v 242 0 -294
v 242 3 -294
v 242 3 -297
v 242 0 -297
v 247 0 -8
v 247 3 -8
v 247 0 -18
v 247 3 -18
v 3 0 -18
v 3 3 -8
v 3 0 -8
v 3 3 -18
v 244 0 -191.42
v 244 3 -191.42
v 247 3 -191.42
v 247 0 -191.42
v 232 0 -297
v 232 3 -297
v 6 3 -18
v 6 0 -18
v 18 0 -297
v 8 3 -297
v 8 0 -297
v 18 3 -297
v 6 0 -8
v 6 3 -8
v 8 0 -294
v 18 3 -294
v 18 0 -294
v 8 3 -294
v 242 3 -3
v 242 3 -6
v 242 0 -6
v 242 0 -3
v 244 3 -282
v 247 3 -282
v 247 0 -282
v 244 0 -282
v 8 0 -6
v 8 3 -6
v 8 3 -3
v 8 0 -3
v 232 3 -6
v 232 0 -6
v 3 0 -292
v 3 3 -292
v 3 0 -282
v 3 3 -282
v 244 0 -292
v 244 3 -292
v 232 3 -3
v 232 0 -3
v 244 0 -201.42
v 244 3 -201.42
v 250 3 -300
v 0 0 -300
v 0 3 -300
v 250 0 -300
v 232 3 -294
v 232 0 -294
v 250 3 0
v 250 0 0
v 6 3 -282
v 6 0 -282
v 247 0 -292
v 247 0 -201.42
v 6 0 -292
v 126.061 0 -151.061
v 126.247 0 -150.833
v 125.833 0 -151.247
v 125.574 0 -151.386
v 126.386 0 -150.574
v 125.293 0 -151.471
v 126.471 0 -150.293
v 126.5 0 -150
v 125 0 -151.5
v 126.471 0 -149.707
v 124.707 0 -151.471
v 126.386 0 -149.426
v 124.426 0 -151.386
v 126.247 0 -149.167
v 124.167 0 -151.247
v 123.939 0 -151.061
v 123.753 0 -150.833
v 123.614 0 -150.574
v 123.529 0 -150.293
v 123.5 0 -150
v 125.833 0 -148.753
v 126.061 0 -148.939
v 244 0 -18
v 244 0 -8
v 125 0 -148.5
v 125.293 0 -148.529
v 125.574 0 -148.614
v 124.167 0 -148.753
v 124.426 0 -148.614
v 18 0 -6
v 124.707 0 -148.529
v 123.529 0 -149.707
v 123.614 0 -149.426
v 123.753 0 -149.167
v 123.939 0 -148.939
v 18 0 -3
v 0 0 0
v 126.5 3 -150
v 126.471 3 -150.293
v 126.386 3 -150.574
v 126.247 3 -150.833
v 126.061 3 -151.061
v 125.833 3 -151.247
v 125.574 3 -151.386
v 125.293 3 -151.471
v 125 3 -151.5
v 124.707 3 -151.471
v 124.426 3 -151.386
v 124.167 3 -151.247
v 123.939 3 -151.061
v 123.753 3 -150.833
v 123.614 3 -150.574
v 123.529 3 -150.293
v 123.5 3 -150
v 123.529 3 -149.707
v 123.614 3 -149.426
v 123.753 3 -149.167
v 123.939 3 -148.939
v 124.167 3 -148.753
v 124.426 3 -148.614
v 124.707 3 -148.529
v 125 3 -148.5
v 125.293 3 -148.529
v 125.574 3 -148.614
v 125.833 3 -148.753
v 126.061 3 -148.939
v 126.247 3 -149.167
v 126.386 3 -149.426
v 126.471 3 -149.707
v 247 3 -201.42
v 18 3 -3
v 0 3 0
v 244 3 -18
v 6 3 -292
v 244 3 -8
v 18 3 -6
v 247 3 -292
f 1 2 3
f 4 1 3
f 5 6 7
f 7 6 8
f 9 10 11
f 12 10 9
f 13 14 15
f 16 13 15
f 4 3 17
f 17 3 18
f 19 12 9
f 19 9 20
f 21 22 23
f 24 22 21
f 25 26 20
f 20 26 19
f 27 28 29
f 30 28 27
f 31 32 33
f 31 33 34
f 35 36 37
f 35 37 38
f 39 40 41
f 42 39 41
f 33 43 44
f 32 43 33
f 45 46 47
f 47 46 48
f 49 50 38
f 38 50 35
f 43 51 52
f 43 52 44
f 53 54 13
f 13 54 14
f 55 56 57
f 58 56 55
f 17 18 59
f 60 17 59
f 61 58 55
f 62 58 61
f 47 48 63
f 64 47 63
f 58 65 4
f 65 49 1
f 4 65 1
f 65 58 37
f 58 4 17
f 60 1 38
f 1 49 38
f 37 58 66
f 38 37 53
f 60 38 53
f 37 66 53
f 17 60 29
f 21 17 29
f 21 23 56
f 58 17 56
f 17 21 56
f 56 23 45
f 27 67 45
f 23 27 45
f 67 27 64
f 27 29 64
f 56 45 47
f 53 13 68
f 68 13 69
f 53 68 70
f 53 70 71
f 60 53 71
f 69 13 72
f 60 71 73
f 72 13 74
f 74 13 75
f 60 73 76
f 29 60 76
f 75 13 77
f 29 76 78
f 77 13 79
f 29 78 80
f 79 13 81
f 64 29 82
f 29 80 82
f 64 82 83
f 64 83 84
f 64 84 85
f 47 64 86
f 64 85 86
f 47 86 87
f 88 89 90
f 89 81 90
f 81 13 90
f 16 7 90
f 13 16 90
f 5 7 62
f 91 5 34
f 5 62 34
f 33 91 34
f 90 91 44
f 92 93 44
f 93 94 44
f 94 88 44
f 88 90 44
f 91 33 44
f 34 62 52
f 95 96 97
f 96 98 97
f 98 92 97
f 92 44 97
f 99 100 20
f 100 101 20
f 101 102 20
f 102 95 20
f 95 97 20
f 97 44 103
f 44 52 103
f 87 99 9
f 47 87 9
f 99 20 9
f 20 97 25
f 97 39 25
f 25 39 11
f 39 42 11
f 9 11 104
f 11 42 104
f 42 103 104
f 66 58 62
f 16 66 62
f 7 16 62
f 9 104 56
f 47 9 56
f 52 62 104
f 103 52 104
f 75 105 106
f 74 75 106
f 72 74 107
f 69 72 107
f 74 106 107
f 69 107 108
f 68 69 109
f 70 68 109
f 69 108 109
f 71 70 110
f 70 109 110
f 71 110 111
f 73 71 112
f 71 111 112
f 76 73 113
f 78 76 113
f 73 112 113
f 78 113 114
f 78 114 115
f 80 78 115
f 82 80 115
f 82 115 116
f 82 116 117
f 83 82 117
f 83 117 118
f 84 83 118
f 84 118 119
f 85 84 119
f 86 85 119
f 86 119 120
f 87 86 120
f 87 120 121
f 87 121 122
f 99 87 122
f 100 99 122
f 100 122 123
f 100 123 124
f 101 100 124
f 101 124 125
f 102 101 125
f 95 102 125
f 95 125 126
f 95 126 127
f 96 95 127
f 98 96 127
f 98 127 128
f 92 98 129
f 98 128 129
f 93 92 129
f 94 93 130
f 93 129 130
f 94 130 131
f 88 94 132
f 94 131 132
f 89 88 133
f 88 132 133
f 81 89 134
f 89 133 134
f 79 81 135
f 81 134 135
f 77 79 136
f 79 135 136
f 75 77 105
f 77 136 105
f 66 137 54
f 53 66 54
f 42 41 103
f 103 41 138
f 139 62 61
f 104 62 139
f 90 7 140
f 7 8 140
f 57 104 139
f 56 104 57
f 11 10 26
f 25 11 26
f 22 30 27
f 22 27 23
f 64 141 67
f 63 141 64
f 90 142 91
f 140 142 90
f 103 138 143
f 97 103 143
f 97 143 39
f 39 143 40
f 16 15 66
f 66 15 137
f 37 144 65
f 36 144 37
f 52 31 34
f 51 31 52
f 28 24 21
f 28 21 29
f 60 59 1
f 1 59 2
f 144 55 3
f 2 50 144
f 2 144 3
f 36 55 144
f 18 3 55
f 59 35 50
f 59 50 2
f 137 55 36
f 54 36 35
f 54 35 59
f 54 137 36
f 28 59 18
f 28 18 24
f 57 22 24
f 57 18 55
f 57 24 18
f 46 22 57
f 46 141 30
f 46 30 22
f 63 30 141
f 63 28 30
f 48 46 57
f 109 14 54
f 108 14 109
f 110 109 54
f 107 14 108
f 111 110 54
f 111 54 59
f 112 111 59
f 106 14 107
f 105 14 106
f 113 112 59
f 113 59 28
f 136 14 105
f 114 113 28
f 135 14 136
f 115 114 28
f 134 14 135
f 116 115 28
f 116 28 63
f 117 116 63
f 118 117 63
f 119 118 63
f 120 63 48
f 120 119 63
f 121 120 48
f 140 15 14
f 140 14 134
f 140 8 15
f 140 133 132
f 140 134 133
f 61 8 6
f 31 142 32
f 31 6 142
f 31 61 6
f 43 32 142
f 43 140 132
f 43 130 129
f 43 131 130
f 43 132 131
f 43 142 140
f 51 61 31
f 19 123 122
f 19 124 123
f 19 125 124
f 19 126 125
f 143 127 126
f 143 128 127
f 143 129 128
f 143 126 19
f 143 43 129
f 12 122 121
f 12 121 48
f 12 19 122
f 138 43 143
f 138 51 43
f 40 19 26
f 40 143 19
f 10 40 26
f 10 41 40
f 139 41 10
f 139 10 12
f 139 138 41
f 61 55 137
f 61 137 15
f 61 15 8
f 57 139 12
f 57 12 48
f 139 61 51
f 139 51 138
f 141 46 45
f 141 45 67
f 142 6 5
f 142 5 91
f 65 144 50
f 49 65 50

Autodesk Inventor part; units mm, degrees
ref_plane "YZ Plane" through (0, 0, 0) normal (1, 0, 0) x (0, 1, 0)
ref_plane "XZ Plane" through (0, 0, 0) normal (0, 1, 0) x (-1, 0, 0)
ref_plane "XY Plane" through (0, 0, 0) normal (0, 0, 1) x (1, 0, 0)
sketch "Sketch1" plane through (0, 0, 0) normal (0, 1, 0) x (-1, 0, 0)
  line L0 (0, -300) -> (-250, -300)
  line L1 (-250, -300) -> (-250, 0)
  line L2 (-250, 0) -> (0, 0)
  line L3 (0, 0) -> (0, -300)
  dimension "d0" = 300
  dimension "d1" = 250
extrude "Extrusion1" add sketch "Sketch1" along normal blind 3
sketch "Sketch2" plane through (0, 3, 0) normal (0, 1, 0) x (1, 0, 0)
  line L0 (8, 3) -> (18, 3)
  line L1 (18, 3) -> (18, 6)
  line L2 (18, 6) -> (8, 6)
  line L3 (8, 6) -> (8, 3)
  line L4 (3, 8) -> (3, 18)
  line L5 (3, 18) -> (6, 18)
  line L6 (0, 0) -> (250, 0) construction
  line L7 (0, 300) -> (0, 0) construction
  line L8 (125, 0) -> (125, 300) construction
  line L9 (250, 300) -> (0, 300) construction
  line L10 (0, 150) -> (250, 150) construction
  line L11 (250, 0) -> (250, 300) construction
  line L12 (3, 8) -> (6, 8)
  line L13 (6, 8) -> (6, 18)
  line L14 (242, 3) -> (232, 3)
  line L15 (232, 3) -> (232, 6)
  line L16 (232, 6) -> (242, 6)
  line L17 (242, 6) -> (242, 3)
  line L18 (247, 8) -> (247, 18)
  line L19 (247, 18) -> (244, 18)
  line L20 (247, 8) -> (244, 8)
  line L21 (244, 8) -> (244, 18)
  line L22 (8, 297) -> (18, 297)
  line L23 (18, 297) -> (18, 294)
  line L24 (18, 294) -> (8, 294)
  line L25 (8, 294) -> (8, 297)
  line L26 (3, 292) -> (3, 282)
  line L27 (3, 282) -> (6, 282)
  line L28 (3, 292) -> (6, 292)
  line L29 (6, 292) -> (6, 282)
  line L30 (242, 297) -> (232, 297)
  line L31 (232, 297) -> (232, 294)
  line L32 (242, 294) -> (242, 297)
  line L33 (247, 292) -> (247, 282)
  line L34 (247, 282) -> (244, 282)
  line L35 (247, 292) -> (244, 292)
  line L36 (244, 292) -> (244, 282)
  line L37 (232, 294) -> (242, 294)
  dimension "d6" = 8
  dimension "d7" = 3
  dimension "d9" = 10
  dimension "d12" = 3
  dimension "d13" = 10
  dimension "d14" = 3
  dimension "d15" = 3
  dimension "d16" = 8
extrude "Extrusion2" cut sketch "Sketch2" against normal blind 10
sketch "Sketch3" plane through (0, 3, 0) normal (0, 1, 0) x (1, 0, 0)
  circle A0 centre (125, 150) radius 1.5
  line L0 (0, 300) -> (0, 0) projected
  line L1 (0, 0) -> (250, 0) projected
  point P0 (0, 150)
  point P1 (125, 0)
  dimension "d17" = 3
extrude "Extrusion3" cut sketch "Sketch3" against normal blind 3
sketch "Sketch4" plane through (0, 3, 0) normal (0, 1, 0) x (1, 0, 0)
  line L0 (141.42, 3) -> (151.42, 3)
  line L1 (151.42, 3) -> (151.42, 6)
  line L2 (151.42, 6) -> (141.42, 6)
  line L3 (141.42, 6) -> (141.42, 3)
  line L4 (232, 3) -> (232, 6) projected
  line L5 (247, 201.42) -> (244, 201.42)
  line L6 (244, 201.42) -> (244, 191.42)
  line L7 (244, 191.42) -> (247, 191.42)
  line L8 (247, 191.42) -> (247, 201.42)
  point P0 (0, 0)
  point P1 (247, 282)
  dimension "d20" = 3
  dimension "d21" = 80.58
  dimension "d22" = 10
  dimension "d25" = 10
  dimension "d26" = 80.58
  dimension "d27" = 3
extrude "Extrusion4" cut sketch "Sketch4" against normal blind 3 contours L8 L7 L6 L5
sketch "Sketch5" plane through (0, 3, 0) normal (0, 1, 0) x (1, 0, 0)
  point P0 (0, 0)
equation "\"d10\" = d4"
equation "\"d4\" = 10"
properties part number "Base_de_equipo"
